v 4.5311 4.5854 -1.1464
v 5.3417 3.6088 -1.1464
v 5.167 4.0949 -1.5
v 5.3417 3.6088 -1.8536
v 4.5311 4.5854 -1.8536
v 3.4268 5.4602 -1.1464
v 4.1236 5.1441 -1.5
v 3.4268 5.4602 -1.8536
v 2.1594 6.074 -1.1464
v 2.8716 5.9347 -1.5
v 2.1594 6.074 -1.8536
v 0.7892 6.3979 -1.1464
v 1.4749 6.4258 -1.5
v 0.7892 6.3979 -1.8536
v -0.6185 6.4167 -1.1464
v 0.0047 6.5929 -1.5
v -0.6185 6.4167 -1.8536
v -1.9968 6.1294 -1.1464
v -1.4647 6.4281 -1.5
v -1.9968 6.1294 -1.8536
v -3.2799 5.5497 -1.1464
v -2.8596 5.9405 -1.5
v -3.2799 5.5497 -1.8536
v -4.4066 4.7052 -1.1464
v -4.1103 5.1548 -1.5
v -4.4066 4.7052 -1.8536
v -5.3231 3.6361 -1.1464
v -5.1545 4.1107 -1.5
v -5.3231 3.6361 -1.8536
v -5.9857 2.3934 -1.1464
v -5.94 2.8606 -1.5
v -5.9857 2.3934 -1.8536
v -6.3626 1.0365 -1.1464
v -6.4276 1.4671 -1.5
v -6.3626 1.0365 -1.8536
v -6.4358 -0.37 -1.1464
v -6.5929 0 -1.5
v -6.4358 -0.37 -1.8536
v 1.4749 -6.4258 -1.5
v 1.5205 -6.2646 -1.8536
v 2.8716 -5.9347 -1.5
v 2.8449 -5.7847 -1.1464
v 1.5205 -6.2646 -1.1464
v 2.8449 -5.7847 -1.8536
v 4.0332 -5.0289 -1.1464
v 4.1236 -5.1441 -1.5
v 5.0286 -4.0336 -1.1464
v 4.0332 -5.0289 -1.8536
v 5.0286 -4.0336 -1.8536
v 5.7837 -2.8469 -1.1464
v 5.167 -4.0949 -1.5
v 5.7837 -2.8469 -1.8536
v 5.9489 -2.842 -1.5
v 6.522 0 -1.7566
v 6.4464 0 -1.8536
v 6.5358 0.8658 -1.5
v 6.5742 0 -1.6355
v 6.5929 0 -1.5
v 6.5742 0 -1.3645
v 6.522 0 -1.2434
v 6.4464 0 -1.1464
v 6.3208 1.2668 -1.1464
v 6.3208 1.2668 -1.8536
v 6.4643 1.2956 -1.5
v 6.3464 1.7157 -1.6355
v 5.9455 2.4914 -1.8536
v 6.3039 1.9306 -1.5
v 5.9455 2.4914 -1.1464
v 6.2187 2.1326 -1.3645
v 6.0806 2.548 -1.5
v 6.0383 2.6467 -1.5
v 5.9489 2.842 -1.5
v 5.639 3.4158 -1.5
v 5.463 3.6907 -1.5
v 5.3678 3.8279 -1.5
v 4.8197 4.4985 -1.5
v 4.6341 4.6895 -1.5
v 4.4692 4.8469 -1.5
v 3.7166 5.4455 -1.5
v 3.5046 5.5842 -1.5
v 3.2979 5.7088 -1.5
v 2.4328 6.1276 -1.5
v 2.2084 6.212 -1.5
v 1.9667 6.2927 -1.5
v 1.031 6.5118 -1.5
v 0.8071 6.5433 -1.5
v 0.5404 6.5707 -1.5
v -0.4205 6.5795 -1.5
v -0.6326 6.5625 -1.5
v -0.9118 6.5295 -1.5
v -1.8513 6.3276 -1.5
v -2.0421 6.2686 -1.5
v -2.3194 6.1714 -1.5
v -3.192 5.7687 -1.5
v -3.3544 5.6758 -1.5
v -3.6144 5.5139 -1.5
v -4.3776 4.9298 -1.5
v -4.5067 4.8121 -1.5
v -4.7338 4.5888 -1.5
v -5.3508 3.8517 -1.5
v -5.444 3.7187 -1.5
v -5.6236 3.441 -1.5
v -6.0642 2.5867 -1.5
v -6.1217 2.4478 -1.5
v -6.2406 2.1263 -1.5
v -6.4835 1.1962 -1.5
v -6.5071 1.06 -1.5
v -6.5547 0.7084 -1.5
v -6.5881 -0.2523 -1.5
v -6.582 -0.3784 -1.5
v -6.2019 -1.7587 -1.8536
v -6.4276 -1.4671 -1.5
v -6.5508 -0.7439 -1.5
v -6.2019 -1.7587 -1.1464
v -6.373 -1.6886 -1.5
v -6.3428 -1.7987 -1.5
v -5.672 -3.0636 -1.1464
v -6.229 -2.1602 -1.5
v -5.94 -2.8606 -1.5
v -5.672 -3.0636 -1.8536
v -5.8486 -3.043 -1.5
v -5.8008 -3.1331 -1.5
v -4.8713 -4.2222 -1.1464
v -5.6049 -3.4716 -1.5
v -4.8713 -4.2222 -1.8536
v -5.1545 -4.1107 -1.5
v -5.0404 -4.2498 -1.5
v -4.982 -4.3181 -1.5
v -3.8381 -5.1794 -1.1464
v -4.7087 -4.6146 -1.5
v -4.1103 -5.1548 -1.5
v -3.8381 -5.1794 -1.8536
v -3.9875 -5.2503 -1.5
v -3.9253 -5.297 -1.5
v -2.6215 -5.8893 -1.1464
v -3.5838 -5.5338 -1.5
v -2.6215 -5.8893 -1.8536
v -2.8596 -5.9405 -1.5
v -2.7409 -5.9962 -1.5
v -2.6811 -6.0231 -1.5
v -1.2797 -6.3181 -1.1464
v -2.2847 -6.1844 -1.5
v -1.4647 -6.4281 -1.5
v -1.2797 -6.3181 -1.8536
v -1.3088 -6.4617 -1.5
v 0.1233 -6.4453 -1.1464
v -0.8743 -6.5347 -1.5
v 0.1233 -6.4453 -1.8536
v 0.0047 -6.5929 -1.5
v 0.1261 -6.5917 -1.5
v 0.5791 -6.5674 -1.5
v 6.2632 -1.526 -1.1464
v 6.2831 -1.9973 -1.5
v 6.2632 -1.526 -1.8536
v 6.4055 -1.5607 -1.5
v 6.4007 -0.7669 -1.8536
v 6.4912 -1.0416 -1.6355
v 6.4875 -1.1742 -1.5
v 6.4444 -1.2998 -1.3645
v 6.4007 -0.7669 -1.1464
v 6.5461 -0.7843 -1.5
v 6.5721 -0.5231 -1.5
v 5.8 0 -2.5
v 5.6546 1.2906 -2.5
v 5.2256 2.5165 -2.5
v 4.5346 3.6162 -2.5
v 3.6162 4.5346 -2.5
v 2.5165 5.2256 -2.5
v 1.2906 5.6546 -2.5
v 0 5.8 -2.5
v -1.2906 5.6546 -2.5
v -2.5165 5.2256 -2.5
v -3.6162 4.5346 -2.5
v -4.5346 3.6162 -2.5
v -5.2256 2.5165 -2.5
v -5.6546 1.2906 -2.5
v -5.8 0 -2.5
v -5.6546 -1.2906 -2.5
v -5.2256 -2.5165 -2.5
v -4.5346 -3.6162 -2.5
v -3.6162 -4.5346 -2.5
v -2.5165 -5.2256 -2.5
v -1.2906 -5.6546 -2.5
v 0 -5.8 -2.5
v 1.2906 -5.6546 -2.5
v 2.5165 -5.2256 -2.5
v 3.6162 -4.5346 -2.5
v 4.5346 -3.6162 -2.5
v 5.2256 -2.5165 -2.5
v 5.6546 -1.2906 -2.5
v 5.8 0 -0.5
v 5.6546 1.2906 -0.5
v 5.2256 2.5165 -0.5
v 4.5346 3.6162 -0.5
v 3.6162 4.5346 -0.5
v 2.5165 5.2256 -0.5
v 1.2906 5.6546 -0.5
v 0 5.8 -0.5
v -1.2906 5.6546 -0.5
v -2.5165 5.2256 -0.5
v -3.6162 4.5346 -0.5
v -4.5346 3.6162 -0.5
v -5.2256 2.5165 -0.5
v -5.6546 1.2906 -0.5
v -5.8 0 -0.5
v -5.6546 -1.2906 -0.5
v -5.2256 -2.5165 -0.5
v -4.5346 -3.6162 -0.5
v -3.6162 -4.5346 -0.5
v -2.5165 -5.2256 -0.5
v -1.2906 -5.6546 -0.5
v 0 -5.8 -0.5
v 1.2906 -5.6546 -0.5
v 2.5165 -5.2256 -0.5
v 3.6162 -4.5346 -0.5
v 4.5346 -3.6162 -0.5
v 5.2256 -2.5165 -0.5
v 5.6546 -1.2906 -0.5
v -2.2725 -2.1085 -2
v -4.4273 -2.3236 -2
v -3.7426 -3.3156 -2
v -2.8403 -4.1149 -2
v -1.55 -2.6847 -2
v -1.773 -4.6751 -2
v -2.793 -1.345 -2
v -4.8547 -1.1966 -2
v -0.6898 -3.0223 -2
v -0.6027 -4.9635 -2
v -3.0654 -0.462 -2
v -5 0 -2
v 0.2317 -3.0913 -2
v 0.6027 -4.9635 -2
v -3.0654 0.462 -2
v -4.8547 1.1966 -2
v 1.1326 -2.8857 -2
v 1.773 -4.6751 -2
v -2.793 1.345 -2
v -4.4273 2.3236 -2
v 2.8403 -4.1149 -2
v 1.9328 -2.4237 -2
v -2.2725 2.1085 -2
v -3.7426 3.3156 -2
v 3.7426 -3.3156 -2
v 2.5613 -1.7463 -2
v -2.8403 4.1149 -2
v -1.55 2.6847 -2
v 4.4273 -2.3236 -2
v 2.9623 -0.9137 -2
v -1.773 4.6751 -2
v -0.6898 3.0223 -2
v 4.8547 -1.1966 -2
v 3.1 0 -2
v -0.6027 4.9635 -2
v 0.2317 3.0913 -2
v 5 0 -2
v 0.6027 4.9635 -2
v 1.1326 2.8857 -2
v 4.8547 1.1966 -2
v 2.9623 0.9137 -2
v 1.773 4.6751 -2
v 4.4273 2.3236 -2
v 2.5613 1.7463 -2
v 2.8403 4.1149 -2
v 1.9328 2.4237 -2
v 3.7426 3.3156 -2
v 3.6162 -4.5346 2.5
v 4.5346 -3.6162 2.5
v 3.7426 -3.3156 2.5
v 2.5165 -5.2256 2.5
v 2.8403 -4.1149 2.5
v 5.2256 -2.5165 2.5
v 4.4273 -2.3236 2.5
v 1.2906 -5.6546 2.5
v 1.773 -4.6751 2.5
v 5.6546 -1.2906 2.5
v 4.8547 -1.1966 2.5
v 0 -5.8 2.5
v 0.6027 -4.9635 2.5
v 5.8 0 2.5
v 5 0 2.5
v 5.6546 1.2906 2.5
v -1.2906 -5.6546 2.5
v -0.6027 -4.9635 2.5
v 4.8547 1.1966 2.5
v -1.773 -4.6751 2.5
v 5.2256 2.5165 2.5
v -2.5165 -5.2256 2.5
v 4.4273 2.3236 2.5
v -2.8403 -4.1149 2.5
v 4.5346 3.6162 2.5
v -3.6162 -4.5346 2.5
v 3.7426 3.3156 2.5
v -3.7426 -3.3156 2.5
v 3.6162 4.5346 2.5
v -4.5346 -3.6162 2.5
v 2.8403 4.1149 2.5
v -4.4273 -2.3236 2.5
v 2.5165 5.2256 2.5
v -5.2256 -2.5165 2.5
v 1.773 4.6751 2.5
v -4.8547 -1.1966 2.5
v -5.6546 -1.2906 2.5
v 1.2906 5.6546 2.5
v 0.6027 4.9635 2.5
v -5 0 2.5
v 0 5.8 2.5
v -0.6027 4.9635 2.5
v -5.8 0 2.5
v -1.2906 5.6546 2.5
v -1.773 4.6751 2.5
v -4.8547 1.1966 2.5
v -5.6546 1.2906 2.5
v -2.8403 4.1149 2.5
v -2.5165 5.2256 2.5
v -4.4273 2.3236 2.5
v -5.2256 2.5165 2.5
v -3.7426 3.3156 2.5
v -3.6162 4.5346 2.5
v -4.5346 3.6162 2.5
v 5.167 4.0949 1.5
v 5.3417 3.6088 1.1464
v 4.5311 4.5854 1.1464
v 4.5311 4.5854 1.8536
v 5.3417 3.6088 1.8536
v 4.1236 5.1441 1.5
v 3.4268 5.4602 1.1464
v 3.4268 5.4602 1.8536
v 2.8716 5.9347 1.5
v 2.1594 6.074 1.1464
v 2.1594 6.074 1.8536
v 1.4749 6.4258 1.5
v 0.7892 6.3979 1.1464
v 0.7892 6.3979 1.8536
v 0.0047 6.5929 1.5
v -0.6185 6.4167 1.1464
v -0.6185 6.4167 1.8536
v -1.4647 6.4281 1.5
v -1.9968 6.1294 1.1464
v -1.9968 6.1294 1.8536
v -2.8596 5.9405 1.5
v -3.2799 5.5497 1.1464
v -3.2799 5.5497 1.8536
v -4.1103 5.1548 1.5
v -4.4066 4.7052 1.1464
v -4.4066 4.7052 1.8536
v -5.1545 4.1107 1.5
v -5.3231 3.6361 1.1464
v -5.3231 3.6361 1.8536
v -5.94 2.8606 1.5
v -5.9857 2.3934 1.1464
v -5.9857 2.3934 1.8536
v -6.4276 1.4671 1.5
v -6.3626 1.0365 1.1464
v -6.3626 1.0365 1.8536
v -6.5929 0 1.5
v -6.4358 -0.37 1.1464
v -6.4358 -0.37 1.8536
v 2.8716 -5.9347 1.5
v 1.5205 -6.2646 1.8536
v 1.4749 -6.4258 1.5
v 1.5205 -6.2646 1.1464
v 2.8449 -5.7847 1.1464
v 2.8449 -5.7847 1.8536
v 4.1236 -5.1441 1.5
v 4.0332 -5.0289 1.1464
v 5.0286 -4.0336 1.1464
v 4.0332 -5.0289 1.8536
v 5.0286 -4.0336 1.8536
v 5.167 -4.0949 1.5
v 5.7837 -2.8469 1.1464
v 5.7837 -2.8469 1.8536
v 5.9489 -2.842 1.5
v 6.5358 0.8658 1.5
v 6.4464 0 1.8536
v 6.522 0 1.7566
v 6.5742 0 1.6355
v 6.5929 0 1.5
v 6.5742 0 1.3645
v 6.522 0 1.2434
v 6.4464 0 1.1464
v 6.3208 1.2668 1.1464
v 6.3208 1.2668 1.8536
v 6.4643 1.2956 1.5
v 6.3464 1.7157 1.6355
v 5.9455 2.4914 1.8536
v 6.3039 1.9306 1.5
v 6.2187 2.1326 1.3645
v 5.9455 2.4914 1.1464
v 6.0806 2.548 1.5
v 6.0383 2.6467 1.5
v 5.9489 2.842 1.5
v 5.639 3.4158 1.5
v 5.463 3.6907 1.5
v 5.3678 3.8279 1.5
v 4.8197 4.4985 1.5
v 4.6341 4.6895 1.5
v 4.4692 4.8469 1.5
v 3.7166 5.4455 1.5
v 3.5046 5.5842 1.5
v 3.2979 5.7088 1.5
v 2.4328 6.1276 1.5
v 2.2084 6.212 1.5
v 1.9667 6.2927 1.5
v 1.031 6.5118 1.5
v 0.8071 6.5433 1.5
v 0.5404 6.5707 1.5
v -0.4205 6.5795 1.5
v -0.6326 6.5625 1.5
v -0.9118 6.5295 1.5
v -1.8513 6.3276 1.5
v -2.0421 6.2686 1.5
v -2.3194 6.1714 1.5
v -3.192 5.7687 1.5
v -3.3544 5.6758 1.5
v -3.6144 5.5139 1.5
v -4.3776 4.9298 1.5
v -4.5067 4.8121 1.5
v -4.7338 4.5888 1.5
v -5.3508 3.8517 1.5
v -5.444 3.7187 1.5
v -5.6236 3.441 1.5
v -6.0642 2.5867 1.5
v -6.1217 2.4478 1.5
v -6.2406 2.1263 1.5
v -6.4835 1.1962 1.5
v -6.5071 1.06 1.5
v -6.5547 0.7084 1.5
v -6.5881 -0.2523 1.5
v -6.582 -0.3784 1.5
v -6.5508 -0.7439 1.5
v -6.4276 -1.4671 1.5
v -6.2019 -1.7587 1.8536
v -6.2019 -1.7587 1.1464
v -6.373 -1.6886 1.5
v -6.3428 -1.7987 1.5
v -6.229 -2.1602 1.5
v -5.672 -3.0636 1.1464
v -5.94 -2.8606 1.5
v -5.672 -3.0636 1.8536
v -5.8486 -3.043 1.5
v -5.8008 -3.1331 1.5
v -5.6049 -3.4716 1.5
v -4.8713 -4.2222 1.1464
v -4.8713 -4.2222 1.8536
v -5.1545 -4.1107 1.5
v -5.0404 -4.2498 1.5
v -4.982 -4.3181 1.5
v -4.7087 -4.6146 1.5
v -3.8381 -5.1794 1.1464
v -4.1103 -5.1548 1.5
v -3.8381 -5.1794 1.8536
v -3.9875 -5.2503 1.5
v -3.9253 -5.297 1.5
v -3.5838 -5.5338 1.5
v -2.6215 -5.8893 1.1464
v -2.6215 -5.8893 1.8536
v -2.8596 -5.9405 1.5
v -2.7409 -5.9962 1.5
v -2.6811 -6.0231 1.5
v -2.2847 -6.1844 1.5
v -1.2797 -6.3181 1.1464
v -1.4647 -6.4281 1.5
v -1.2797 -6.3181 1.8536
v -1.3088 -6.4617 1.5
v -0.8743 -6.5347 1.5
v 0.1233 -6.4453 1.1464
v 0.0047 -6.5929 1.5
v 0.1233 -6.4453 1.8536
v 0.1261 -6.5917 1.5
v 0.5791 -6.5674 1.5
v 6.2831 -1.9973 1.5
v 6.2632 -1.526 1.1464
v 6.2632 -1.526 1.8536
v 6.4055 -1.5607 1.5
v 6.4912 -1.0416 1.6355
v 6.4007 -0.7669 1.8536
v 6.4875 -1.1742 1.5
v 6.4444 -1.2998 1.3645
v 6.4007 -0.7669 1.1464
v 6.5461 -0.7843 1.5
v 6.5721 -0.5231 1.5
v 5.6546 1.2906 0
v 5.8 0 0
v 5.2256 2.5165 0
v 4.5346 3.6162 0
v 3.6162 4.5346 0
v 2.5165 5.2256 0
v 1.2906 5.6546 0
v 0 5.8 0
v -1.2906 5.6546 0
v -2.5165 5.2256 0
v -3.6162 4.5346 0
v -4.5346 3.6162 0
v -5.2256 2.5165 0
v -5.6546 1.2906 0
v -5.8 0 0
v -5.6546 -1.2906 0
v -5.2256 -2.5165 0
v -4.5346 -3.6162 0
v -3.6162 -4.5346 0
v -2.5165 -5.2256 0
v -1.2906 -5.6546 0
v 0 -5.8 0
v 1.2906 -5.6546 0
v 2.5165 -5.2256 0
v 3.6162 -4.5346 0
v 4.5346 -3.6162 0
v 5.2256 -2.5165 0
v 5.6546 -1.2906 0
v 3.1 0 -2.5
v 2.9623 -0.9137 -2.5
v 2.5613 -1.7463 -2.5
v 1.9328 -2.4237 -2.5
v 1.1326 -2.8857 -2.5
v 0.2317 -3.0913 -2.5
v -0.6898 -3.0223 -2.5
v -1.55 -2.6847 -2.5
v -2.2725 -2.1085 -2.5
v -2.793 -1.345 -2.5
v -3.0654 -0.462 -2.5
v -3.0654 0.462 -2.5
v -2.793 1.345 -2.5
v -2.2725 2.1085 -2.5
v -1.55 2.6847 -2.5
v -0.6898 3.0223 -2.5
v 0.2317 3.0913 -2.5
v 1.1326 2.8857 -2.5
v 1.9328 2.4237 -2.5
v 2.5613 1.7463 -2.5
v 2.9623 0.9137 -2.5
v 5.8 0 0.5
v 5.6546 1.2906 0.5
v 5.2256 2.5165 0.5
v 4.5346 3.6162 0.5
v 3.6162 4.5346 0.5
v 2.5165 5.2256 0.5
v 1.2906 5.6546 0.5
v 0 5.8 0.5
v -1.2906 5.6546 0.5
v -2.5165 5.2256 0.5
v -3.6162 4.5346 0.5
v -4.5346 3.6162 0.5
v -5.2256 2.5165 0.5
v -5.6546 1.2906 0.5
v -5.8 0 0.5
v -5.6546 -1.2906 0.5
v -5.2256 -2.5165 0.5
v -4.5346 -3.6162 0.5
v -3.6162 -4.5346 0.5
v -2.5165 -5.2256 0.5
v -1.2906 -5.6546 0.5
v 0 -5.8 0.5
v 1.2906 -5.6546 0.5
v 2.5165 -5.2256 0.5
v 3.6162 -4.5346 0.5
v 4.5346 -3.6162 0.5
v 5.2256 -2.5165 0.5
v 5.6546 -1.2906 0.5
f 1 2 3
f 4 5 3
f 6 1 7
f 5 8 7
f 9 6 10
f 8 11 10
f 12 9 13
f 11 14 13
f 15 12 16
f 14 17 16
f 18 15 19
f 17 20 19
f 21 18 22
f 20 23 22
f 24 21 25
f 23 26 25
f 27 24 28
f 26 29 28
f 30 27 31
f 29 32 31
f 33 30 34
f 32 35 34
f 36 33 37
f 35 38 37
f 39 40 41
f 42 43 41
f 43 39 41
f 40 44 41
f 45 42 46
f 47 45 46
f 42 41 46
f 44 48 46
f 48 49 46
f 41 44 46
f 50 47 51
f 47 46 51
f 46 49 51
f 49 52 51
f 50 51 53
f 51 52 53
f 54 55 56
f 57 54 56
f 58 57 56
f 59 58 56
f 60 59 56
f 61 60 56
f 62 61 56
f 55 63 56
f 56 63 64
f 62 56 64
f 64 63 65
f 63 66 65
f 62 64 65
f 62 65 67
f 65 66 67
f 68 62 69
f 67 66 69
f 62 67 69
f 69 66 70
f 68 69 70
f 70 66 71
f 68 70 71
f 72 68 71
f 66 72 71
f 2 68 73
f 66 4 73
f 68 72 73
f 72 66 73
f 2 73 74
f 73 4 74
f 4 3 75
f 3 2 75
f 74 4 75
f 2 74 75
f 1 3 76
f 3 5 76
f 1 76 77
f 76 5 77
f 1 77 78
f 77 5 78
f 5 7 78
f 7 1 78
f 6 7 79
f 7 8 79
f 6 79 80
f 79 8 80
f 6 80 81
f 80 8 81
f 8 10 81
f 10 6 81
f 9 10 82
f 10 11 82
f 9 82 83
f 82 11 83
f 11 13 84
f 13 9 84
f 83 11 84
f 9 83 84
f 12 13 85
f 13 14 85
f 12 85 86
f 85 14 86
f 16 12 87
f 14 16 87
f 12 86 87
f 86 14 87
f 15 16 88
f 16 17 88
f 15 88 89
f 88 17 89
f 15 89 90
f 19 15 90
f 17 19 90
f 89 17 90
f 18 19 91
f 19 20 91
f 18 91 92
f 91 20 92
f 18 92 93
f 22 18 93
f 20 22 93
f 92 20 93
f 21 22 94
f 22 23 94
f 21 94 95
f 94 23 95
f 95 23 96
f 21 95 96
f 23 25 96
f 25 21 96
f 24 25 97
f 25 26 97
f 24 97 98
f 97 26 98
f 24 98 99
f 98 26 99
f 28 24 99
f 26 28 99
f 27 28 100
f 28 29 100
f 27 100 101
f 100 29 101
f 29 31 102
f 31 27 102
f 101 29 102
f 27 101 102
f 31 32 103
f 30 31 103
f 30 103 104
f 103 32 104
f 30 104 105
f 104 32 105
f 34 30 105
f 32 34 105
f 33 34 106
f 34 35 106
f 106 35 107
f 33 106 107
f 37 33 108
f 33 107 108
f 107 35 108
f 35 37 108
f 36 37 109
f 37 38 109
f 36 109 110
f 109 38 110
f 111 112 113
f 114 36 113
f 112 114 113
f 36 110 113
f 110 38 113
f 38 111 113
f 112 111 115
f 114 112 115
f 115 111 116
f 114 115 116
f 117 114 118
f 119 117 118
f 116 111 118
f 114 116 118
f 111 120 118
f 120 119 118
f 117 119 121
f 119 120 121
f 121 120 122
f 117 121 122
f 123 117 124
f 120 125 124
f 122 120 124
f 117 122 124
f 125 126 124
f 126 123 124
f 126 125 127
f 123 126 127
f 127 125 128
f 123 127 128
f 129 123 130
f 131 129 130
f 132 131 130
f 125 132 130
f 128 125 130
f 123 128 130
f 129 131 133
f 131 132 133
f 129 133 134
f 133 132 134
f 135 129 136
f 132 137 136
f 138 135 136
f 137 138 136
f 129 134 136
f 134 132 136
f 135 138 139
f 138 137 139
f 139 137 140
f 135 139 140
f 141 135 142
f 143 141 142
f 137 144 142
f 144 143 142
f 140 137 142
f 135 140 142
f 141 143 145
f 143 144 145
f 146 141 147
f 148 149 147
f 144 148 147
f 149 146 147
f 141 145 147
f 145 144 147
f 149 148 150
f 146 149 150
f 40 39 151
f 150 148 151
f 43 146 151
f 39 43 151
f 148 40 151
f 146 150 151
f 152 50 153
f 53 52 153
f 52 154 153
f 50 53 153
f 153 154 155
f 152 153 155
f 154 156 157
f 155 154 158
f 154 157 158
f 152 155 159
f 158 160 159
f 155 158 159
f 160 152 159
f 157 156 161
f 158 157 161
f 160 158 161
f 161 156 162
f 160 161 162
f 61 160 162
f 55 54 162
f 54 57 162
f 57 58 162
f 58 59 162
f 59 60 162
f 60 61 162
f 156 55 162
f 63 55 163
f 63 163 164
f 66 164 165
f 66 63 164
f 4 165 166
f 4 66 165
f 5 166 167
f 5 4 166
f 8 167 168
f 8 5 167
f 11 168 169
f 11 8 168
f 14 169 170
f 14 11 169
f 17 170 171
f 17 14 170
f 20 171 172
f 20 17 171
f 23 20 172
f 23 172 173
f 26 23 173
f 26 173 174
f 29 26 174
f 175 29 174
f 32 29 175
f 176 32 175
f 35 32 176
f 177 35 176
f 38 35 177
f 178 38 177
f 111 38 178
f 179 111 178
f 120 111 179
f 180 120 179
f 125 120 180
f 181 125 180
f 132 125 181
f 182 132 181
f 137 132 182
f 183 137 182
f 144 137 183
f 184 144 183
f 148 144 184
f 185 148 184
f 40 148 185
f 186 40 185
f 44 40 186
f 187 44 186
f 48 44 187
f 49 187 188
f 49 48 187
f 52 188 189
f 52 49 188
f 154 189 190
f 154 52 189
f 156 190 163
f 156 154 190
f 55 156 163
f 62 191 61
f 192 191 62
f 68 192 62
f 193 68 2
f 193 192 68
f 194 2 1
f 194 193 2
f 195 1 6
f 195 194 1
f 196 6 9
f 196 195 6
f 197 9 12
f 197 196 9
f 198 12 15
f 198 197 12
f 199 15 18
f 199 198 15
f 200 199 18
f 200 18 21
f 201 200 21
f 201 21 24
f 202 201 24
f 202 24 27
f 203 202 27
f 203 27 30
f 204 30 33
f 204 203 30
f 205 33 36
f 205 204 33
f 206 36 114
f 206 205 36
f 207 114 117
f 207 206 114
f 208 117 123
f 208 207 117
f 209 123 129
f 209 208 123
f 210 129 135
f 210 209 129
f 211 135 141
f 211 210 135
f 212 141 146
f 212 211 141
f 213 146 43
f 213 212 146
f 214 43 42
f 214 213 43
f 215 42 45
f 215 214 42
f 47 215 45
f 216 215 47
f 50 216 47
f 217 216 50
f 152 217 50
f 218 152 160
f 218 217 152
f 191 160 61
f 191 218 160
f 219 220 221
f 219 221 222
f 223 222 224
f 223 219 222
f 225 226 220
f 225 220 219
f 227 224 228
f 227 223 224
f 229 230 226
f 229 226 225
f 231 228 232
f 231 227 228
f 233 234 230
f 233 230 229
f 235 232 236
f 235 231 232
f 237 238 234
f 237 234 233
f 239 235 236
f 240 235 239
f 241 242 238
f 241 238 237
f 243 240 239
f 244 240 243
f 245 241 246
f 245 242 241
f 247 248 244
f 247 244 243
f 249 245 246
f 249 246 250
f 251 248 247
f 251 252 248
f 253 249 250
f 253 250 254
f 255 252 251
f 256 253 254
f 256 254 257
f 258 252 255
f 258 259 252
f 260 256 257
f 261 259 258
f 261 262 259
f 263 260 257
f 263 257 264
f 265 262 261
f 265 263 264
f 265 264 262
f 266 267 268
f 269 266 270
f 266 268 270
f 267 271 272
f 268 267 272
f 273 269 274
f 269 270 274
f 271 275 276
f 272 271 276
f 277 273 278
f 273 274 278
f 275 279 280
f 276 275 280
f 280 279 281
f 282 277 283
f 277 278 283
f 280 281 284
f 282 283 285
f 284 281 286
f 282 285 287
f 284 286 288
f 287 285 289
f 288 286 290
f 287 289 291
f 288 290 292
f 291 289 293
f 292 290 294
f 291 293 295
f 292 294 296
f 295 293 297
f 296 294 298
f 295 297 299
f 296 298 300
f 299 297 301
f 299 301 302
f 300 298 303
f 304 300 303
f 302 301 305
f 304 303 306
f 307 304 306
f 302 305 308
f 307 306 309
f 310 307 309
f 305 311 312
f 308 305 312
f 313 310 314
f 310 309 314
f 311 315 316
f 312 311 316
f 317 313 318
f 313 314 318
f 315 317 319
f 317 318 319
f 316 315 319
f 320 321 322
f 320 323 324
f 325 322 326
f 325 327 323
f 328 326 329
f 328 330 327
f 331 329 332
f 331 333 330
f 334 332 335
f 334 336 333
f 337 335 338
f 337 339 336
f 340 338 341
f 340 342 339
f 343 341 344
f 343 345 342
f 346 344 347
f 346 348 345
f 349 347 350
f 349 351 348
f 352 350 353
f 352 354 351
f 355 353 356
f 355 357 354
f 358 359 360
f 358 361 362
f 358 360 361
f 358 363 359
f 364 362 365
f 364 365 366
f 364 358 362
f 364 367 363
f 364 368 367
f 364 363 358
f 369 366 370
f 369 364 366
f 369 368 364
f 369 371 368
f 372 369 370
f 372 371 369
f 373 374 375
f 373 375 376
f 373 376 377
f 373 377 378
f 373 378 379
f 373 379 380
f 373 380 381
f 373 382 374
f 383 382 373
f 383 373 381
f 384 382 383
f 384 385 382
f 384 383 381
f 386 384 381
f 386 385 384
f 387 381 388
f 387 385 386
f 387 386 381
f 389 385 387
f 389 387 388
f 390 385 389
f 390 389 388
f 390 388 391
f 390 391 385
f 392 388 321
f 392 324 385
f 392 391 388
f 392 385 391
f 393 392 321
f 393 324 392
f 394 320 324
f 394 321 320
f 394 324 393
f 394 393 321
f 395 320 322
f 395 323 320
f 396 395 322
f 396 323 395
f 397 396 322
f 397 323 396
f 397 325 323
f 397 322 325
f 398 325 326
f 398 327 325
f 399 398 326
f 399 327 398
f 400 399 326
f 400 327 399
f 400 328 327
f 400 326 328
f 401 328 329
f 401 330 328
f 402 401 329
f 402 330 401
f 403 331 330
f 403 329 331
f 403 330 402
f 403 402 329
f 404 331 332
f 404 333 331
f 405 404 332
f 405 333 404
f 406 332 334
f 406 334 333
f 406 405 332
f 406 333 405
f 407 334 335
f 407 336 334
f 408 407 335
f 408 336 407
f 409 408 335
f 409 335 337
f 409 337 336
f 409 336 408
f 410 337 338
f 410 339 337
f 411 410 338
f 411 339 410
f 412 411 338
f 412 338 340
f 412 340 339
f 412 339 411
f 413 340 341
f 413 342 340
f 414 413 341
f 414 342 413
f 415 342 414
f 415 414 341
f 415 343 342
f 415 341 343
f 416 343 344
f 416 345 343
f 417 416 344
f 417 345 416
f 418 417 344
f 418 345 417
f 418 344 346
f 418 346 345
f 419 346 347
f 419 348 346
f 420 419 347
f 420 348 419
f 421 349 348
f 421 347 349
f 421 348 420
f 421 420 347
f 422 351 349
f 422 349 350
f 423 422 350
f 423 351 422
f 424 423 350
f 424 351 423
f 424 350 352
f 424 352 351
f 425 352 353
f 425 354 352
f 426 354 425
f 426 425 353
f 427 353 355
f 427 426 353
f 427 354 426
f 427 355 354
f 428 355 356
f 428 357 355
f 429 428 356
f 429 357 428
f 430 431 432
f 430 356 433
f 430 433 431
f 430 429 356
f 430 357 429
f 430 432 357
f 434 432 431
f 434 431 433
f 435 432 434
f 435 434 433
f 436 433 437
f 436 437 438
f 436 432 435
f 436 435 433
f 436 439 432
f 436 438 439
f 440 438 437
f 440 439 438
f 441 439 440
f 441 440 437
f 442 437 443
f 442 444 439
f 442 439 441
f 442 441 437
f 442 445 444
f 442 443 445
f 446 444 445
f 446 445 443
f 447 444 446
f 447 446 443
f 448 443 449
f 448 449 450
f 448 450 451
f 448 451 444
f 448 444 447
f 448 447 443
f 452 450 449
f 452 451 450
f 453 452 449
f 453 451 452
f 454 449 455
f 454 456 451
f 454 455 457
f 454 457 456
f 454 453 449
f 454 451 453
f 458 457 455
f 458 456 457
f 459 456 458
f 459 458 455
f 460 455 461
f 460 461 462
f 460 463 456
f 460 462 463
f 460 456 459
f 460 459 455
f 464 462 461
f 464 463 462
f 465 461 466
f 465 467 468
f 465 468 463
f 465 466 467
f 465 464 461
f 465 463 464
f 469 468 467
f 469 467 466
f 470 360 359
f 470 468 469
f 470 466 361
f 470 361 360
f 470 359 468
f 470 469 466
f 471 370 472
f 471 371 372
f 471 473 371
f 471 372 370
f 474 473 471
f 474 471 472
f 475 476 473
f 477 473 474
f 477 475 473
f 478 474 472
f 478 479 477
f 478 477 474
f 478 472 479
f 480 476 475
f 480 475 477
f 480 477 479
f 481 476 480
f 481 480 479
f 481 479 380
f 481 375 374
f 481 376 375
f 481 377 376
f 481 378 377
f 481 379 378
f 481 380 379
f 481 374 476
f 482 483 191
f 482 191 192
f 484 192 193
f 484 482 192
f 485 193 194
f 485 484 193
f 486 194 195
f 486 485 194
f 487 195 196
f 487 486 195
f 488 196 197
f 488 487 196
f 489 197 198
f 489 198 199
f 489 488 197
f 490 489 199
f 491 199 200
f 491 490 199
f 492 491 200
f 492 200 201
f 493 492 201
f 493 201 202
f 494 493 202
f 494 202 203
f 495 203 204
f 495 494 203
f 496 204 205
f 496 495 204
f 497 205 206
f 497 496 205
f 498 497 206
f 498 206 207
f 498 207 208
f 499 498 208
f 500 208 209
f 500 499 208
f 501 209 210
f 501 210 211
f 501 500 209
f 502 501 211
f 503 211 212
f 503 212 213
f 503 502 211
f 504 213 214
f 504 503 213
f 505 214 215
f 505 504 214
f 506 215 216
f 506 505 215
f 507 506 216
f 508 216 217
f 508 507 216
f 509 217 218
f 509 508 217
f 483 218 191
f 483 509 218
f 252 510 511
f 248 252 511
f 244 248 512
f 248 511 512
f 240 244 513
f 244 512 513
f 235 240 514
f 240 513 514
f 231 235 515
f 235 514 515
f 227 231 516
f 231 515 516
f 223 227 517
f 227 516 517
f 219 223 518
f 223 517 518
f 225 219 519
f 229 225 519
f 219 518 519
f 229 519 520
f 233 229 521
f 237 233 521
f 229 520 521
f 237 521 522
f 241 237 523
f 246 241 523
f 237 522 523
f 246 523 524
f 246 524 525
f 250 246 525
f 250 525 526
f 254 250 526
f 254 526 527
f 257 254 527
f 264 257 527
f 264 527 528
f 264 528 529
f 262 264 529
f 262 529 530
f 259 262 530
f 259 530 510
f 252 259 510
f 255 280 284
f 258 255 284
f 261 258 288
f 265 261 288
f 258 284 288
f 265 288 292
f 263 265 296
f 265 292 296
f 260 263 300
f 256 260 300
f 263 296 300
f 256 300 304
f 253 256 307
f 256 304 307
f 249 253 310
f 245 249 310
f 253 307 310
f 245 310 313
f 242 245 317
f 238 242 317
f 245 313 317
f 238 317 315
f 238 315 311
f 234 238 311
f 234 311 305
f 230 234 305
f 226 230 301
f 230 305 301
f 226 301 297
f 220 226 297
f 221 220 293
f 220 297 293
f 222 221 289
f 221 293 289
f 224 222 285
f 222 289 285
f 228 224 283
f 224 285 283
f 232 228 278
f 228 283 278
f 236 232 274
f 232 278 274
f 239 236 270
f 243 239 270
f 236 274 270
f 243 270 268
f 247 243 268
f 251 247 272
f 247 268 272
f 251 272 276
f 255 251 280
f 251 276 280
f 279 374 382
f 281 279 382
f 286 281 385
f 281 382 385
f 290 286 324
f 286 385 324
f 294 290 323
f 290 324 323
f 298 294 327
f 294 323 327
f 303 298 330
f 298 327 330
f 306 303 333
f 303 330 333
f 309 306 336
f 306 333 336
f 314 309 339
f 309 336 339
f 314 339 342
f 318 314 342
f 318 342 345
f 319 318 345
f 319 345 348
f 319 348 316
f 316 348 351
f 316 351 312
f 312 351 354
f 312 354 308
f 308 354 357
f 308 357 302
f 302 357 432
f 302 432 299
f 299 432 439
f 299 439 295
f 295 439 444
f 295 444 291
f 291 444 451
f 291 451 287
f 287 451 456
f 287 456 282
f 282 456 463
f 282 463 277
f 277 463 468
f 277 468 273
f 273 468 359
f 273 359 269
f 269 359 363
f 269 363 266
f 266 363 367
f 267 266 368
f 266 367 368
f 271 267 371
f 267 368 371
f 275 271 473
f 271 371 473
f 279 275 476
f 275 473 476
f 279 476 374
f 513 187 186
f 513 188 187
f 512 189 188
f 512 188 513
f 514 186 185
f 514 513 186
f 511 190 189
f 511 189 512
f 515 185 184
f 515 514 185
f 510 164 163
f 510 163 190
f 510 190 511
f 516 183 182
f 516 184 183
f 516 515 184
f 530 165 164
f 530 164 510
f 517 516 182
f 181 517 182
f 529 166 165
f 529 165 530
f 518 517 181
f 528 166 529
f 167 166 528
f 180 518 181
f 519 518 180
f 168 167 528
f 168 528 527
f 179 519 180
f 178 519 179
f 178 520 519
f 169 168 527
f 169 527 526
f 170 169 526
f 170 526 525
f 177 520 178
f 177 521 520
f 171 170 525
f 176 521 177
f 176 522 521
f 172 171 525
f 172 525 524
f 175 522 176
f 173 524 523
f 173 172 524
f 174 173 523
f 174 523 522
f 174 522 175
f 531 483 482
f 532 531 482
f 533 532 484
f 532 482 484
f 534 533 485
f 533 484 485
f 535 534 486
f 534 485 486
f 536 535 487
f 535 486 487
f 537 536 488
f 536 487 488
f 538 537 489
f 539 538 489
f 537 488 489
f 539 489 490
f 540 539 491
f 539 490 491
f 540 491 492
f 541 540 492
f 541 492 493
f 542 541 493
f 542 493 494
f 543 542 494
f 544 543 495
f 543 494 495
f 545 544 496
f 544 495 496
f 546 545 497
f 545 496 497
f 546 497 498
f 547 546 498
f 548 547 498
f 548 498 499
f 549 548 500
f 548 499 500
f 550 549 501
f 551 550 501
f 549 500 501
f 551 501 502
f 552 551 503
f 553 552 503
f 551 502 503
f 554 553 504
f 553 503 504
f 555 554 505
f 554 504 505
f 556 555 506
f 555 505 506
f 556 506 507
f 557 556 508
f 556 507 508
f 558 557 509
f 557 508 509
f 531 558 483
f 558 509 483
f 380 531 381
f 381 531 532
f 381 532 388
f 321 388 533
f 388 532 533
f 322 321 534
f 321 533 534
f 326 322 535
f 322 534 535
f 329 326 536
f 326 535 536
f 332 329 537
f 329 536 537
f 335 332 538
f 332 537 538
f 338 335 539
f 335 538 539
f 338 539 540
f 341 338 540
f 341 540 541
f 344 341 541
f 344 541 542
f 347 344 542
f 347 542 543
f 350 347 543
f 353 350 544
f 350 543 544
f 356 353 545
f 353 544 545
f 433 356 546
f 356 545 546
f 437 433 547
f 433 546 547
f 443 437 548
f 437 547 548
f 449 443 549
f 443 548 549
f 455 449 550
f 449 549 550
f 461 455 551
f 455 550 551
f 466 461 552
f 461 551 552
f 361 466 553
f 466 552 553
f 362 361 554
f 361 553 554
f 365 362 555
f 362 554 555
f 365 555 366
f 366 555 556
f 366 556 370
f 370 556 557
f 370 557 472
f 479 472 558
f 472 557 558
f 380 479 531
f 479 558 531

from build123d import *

# Parameters (mm, degrees)
FILLET_R           = 0.5
SKETCH002_R        = 5
POCKET_DEPTH       = 4.5
SKETCH003_R        = 3.1
POCKET008003_DEPTH = 5.001


with BuildPart() as fillet_body:
    # Sketch001 → Revolution (revolve)
    with BuildSketch(Plane.XZ):
        Polygon((0, -2.5), (5.8, -2.5), (6.8, -1.5), (5.8, -0.5), (5.8, 0), (0, 0), align=None)
    revolve(axis=Axis((0, 0, 0), (0, 0, 1)))

    # Fillet
    fillet_edges = [fillet_body.edges().sort_by_distance(p)[0] for p in [
        (-6.8, 0, -1.5),
    ]]
    fillet(fillet_edges, radius=FILLET_R)


with BuildPart() as part_mirroring:
    # Part__Mirroring: instance of Fillet body
    add(fillet_body.part.mirror(Plane(origin=(0, 0, 0), x_dir=(0, 1, 0), z_dir=(0, 0, 1))))


with BuildPart() as bolthead001:
    # Fusion base: copy of Fillet body
    add(fillet_body.part)

    # Fusion: union Part__Mirroring
    add(part_mirroring.part)

    # Sketch002 → Pocket (cut)
    with BuildSketch(Plane.XY.offset(2.5)):
        Circle(SKETCH002_R)
    extrude(amount=-POCKET_DEPTH, mode=Mode.SUBTRACT)

    # Sketch003 → Pocket008003 (cut, through all)
    with BuildSketch(Plane(origin=(0, 0, -2.5), x_dir=(1, 0, 0), z_dir=(0, 0, -1))):
        Circle(SKETCH003_R)
    extrude(amount=-POCKET008003_DEPTH, mode=Mode.SUBTRACT)


solid = bolthead001.part
